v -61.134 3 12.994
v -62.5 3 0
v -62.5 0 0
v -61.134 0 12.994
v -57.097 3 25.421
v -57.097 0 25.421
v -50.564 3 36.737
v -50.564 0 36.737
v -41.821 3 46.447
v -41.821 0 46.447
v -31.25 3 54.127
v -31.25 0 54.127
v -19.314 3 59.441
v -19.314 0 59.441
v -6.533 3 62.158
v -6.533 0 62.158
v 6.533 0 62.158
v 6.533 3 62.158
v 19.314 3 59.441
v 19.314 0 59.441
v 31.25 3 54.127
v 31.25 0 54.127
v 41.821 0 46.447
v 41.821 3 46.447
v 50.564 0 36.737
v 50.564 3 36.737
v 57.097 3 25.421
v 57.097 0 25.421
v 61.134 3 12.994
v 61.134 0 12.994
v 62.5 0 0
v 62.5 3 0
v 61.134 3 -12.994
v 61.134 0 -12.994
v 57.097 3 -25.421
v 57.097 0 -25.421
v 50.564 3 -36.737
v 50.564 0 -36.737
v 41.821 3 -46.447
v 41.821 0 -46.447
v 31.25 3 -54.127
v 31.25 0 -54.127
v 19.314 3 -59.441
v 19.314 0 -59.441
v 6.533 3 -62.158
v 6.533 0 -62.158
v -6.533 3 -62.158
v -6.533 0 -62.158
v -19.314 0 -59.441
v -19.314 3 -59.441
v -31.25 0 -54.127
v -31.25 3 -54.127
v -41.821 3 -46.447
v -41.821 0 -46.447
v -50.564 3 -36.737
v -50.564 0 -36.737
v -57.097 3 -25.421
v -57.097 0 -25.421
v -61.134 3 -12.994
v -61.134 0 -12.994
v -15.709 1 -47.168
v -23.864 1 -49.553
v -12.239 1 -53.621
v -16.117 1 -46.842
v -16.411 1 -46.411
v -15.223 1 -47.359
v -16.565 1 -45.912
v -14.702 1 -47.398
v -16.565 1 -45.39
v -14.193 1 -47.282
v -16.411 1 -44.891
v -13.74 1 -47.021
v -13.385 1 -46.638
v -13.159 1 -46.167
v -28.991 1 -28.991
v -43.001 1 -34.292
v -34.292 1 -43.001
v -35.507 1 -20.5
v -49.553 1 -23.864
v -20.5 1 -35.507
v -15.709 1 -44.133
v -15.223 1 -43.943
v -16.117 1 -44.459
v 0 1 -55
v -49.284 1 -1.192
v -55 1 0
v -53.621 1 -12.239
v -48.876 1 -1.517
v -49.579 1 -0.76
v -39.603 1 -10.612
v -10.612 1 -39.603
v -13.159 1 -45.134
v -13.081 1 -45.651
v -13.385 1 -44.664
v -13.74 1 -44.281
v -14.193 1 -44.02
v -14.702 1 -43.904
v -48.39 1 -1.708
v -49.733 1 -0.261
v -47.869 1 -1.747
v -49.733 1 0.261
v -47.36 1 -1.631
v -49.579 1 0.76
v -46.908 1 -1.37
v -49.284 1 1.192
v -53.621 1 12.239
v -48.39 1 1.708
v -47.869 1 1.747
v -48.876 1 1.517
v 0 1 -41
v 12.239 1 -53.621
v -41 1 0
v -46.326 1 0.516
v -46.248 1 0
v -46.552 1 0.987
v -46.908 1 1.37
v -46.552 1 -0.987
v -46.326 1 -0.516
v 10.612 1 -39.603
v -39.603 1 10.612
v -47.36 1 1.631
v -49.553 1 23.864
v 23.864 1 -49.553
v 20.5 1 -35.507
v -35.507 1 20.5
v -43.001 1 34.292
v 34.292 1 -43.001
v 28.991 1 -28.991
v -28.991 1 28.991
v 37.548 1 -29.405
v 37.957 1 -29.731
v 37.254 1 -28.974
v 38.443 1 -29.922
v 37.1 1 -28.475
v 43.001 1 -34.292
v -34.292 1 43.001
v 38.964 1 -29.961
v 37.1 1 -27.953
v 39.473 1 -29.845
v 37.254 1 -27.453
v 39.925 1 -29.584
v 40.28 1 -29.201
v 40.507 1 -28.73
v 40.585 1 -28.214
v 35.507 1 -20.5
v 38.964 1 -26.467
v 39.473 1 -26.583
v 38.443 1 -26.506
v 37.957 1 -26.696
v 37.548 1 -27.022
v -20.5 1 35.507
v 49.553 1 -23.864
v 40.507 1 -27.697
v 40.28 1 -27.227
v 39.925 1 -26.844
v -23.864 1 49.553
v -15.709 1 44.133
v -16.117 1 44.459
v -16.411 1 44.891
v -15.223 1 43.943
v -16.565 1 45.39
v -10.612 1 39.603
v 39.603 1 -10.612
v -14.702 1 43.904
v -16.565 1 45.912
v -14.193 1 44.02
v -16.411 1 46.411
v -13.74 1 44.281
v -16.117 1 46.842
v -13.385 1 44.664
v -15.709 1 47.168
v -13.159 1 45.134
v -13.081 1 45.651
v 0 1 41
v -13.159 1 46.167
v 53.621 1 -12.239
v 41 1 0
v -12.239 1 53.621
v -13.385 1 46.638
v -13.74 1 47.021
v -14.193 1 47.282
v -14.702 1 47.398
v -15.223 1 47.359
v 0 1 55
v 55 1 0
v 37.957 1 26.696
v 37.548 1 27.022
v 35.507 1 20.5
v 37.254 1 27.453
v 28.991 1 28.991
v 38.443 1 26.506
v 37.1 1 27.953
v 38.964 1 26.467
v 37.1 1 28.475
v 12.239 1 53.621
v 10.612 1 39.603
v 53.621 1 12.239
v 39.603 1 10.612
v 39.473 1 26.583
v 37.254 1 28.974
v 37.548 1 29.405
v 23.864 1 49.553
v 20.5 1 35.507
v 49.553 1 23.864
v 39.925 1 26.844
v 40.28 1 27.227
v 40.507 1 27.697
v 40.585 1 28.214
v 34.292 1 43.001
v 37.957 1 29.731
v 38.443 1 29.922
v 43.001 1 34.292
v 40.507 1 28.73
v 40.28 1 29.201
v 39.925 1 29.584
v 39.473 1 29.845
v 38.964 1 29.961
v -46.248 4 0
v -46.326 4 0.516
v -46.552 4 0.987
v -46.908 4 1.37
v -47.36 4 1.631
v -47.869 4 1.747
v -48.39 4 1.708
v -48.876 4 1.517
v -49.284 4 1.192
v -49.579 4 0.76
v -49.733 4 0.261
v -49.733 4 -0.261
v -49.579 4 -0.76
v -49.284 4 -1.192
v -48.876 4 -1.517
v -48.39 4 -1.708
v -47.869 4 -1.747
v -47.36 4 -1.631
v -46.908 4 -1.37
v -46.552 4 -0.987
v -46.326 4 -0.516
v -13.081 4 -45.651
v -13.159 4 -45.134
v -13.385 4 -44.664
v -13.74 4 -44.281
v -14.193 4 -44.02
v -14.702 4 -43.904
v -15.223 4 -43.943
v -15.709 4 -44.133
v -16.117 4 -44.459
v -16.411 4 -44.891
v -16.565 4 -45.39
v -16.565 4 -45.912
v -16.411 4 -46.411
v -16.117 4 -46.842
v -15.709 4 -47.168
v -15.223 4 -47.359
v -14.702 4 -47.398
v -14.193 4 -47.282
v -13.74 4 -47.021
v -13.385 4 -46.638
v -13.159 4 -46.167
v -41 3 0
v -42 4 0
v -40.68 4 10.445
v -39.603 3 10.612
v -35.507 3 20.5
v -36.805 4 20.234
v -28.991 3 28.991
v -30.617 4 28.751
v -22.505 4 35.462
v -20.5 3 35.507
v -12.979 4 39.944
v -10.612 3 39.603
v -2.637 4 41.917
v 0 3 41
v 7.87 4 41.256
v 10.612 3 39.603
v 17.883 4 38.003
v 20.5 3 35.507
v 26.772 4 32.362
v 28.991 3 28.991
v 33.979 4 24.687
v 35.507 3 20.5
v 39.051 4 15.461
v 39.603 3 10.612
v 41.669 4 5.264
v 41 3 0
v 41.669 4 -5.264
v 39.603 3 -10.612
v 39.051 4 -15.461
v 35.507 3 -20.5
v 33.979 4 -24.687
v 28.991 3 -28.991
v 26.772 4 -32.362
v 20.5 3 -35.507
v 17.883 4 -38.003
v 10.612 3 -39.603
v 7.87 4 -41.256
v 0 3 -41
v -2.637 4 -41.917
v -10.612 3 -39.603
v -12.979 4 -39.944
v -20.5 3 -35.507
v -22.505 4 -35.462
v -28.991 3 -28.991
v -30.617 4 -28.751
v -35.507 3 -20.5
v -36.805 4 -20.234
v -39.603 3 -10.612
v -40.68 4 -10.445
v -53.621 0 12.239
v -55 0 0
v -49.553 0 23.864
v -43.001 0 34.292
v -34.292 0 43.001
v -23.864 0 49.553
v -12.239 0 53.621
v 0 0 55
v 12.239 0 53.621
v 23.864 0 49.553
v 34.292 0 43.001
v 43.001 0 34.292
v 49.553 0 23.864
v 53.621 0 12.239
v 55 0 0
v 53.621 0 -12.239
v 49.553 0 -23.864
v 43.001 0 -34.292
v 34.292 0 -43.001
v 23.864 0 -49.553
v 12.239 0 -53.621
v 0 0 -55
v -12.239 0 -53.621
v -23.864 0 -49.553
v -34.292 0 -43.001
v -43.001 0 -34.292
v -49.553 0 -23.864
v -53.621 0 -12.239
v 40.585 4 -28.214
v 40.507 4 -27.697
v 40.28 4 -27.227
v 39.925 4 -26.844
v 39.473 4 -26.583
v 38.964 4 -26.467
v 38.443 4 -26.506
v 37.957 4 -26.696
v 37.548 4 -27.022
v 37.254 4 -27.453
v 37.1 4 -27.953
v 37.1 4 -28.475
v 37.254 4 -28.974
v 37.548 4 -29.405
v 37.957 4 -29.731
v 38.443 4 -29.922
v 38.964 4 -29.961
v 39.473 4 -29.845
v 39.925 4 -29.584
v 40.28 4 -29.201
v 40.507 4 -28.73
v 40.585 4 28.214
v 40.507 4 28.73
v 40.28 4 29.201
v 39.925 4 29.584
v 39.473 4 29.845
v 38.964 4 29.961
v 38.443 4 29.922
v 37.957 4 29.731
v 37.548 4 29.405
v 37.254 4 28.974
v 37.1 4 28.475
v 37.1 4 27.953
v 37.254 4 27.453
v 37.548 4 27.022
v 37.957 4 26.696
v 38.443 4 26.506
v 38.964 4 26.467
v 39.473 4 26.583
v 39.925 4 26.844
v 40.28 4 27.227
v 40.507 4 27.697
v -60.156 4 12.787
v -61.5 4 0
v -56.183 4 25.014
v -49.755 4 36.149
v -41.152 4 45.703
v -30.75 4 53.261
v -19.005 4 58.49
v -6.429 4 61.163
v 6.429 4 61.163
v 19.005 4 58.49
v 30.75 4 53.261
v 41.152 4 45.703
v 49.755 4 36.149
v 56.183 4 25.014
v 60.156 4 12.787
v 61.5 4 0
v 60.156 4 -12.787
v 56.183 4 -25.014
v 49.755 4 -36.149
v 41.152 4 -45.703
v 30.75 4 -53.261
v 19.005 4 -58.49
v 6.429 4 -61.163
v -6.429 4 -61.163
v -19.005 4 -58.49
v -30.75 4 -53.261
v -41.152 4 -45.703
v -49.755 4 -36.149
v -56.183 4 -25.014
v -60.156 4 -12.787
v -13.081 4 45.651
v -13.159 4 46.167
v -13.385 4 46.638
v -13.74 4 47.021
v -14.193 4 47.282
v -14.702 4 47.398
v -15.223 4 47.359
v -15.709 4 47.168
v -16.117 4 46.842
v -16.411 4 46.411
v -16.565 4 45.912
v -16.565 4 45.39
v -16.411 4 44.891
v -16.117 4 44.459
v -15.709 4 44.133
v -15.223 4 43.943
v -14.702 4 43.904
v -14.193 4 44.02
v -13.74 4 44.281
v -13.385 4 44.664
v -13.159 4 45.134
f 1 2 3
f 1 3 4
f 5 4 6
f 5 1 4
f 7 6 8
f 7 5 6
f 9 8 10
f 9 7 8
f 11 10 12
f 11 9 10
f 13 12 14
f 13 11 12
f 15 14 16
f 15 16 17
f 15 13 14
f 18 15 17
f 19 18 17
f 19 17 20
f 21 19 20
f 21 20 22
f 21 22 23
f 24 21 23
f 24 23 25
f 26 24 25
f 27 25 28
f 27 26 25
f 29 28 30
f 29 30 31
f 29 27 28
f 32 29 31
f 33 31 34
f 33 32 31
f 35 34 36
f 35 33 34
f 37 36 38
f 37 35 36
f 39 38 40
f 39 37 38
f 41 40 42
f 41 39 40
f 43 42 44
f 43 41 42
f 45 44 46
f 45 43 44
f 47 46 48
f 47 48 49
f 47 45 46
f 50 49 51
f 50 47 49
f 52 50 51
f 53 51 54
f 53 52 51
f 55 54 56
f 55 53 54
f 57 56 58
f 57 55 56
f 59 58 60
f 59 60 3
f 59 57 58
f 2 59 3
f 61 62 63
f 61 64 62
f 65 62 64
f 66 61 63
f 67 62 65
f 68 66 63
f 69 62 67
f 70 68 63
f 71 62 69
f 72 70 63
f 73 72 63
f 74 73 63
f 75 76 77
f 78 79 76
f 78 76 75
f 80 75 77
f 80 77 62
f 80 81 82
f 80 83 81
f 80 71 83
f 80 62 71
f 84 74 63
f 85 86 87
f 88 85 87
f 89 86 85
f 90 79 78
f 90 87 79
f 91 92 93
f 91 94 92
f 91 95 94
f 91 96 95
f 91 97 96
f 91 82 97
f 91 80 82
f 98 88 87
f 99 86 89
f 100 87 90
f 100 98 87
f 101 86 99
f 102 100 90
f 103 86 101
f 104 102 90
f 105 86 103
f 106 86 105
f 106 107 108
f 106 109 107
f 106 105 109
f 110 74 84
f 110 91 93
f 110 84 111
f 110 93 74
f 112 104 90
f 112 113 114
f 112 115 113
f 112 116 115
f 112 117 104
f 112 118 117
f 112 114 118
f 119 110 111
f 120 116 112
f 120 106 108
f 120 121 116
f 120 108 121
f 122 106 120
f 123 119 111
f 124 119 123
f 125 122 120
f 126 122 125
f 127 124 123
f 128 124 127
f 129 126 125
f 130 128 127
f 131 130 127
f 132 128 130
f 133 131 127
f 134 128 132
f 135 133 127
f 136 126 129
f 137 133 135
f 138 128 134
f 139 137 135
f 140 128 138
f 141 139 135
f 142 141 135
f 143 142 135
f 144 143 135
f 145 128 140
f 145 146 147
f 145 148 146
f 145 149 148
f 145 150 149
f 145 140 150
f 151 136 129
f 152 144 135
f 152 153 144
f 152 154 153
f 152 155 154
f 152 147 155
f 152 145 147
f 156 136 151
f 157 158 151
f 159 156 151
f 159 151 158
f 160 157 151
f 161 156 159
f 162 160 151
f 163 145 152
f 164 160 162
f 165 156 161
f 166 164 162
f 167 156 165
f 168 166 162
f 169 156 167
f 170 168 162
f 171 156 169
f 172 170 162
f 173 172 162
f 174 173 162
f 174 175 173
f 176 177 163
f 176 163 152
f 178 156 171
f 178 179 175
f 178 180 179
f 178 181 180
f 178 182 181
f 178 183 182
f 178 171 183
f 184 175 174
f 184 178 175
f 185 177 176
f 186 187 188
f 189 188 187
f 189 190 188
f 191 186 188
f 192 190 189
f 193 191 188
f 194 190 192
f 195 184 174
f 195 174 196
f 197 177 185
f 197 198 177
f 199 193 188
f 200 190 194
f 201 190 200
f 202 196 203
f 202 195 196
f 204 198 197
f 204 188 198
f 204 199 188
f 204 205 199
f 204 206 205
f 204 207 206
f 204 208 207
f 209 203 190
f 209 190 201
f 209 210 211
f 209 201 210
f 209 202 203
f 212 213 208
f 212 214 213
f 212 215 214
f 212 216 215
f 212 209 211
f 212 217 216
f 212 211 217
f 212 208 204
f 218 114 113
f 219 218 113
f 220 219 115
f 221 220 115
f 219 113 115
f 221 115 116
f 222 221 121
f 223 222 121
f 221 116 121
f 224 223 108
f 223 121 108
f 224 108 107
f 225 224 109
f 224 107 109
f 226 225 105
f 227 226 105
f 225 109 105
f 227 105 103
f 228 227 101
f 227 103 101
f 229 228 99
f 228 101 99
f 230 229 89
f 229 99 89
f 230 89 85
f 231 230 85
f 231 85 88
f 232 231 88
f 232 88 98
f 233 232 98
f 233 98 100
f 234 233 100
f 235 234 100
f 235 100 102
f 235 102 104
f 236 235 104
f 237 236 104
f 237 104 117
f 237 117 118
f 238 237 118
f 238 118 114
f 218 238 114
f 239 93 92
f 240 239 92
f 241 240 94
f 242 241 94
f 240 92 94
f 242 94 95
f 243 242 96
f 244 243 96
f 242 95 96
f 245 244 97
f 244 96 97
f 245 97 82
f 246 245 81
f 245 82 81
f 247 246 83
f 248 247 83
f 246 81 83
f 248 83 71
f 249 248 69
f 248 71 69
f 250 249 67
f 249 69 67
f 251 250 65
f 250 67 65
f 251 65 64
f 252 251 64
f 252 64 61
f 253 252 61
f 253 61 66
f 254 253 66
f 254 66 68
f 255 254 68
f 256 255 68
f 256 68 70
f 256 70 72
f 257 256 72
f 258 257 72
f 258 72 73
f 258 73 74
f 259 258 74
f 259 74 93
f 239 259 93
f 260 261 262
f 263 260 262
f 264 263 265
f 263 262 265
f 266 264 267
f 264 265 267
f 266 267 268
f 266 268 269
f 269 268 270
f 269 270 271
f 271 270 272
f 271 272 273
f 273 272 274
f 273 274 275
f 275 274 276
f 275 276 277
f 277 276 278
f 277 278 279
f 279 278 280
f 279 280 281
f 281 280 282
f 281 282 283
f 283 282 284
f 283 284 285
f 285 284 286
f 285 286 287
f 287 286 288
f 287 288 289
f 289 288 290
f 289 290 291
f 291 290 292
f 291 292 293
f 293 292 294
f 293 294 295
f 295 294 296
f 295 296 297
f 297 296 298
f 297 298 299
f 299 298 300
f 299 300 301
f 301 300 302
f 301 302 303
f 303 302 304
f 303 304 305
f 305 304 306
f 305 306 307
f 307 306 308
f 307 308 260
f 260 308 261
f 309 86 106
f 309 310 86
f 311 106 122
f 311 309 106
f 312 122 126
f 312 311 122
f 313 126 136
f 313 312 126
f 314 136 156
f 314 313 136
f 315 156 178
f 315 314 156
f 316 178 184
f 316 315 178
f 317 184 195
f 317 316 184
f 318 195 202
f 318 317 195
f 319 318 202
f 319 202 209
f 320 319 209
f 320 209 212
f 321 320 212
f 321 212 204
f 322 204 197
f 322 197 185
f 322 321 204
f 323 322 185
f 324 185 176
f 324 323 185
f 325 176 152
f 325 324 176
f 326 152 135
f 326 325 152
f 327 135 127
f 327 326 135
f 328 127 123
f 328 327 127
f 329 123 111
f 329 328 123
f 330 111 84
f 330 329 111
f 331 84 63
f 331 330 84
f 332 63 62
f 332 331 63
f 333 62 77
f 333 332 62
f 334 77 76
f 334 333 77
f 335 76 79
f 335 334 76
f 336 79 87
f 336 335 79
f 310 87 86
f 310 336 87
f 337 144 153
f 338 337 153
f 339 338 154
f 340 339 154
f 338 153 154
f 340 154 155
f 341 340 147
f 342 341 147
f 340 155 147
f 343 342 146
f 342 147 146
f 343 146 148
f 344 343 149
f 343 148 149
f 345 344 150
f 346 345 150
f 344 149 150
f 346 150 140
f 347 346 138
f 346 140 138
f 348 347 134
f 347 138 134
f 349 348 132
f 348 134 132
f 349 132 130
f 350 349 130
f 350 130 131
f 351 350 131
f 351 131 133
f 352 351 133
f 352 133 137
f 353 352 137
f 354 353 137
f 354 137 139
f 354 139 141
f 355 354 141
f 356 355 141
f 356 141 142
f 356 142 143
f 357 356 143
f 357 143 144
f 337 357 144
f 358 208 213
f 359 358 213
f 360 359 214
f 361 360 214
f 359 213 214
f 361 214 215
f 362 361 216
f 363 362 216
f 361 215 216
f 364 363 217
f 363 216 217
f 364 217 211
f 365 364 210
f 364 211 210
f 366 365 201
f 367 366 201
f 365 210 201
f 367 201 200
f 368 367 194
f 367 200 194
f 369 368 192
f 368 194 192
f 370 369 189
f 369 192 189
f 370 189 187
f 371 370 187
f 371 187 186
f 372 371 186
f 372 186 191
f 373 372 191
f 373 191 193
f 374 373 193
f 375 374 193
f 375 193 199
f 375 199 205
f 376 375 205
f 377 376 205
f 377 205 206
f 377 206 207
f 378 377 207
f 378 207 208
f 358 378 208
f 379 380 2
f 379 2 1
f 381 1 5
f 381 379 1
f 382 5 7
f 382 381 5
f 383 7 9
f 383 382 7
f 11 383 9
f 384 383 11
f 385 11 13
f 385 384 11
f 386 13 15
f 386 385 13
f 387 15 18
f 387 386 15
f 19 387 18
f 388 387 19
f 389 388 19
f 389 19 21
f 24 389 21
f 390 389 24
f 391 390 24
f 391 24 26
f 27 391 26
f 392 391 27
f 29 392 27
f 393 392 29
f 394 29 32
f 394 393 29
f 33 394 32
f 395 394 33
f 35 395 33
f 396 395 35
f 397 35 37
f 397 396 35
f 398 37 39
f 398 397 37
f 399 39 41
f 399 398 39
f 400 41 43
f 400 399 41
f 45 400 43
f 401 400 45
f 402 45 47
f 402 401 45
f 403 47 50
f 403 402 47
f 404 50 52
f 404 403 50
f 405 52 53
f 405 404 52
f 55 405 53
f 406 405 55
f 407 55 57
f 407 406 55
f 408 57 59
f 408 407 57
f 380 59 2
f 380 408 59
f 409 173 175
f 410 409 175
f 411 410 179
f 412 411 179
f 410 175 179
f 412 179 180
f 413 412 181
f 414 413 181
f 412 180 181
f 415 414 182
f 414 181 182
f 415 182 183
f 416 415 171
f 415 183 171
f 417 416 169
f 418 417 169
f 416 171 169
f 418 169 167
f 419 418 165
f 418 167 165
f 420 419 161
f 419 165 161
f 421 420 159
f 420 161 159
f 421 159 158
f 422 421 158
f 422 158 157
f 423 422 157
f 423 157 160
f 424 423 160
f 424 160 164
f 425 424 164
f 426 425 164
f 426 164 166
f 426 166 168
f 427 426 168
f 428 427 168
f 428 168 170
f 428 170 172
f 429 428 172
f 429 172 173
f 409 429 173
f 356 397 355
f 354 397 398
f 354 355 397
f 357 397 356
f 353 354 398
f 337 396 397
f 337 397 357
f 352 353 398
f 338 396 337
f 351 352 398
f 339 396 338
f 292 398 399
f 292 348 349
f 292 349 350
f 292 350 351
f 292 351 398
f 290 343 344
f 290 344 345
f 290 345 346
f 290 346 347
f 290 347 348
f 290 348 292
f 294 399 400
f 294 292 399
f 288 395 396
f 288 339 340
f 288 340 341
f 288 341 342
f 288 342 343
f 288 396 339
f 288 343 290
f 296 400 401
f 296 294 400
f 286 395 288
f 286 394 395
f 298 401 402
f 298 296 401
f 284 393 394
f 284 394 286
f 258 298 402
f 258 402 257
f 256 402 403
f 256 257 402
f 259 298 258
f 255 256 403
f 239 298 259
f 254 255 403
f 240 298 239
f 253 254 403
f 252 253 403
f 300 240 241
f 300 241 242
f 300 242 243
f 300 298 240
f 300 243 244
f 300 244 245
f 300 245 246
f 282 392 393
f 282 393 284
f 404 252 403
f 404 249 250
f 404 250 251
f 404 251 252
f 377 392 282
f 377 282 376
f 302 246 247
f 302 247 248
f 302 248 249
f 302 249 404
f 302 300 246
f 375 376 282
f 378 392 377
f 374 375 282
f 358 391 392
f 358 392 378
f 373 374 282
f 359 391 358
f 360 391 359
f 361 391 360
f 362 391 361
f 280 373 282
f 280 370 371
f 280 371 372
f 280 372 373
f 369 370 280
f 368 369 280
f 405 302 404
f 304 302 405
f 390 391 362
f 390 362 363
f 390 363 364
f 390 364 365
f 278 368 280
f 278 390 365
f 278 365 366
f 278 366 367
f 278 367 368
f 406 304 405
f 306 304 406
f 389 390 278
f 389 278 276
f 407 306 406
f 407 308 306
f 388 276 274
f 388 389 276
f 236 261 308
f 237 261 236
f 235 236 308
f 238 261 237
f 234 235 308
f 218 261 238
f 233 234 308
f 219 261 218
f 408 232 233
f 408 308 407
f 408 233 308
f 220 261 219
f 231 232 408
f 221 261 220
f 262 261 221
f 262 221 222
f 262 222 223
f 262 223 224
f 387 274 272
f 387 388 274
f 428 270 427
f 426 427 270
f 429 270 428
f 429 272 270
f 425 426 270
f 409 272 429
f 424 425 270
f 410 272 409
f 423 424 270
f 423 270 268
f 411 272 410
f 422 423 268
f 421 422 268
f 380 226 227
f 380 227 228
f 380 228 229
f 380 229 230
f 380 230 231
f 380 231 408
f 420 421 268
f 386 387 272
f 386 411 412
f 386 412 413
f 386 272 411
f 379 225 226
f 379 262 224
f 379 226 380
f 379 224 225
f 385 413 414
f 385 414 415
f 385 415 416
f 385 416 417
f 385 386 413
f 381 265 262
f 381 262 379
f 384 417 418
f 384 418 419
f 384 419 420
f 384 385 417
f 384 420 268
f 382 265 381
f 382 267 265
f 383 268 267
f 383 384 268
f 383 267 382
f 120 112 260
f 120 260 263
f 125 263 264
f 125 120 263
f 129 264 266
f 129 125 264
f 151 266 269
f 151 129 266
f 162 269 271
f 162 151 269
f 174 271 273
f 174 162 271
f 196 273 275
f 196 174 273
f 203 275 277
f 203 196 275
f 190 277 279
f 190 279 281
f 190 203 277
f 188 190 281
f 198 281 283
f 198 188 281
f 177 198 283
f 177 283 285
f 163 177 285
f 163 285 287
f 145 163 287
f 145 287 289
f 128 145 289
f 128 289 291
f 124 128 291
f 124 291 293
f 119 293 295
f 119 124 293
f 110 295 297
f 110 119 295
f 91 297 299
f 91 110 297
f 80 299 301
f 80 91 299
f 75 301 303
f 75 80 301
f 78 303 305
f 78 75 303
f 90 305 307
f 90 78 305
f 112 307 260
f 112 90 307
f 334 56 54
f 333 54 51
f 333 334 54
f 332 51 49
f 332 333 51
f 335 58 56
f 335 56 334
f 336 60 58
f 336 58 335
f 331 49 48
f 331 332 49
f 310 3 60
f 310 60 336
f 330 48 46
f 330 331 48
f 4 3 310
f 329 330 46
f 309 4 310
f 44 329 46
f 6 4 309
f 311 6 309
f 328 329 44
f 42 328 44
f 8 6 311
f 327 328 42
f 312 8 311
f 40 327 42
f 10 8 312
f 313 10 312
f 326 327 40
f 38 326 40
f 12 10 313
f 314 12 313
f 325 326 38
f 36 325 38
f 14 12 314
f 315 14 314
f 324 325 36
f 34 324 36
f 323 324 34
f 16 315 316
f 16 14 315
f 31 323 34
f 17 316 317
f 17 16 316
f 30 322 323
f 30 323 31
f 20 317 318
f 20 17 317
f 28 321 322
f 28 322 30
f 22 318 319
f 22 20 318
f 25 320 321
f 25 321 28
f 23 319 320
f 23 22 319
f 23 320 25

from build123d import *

# Parameters (mm, degrees)
SKETCH2_R          = 1.752085735
CUT_EXTRUDE2_DEPTH = 4
CHAMFER1_SIZE      = 1


with BuildPart() as part:
    # Sketch1 → Revolve1 (revolve)
    with BuildSketch(Plane.XY):
        Polygon((-55, 1), (-55, 0), (-62.5, 0), (-62.5, 4), (-41, 4), (-41, 1), align=None)
    revolve(axis=Axis((0, 0, 0), (0, 1, 0)))

    # Sketch2 → Cut-Extrude2 (cut, through all)
    with BuildSketch(Plane.XZ.offset(-1)):
        with Locations((-48, 0)):
            Circle(SKETCH2_R)
        with Locations((-14.83281573, 45.650712782)):
            Circle(SKETCH2_R)
        with Locations((38.83281573, 28.21369211)):
            Circle(SKETCH2_R)
        with Locations((38.83281573, -28.21369211)):
            Circle(SKETCH2_R)
        with Locations((-14.83281573, -45.650712782)):
            Circle(SKETCH2_R)
    extrude(amount=-CUT_EXTRUDE2_DEPTH, mode=Mode.SUBTRACT)

    # Chamfer1
    chamfer1_edges = [part.edges().sort_by_distance(p)[0] for p in [
        (62.5, 4, 0),
        (41, 4, 0),
    ]]
    chamfer(chamfer1_edges, length=CHAMFER1_SIZE)


solid = part.part
